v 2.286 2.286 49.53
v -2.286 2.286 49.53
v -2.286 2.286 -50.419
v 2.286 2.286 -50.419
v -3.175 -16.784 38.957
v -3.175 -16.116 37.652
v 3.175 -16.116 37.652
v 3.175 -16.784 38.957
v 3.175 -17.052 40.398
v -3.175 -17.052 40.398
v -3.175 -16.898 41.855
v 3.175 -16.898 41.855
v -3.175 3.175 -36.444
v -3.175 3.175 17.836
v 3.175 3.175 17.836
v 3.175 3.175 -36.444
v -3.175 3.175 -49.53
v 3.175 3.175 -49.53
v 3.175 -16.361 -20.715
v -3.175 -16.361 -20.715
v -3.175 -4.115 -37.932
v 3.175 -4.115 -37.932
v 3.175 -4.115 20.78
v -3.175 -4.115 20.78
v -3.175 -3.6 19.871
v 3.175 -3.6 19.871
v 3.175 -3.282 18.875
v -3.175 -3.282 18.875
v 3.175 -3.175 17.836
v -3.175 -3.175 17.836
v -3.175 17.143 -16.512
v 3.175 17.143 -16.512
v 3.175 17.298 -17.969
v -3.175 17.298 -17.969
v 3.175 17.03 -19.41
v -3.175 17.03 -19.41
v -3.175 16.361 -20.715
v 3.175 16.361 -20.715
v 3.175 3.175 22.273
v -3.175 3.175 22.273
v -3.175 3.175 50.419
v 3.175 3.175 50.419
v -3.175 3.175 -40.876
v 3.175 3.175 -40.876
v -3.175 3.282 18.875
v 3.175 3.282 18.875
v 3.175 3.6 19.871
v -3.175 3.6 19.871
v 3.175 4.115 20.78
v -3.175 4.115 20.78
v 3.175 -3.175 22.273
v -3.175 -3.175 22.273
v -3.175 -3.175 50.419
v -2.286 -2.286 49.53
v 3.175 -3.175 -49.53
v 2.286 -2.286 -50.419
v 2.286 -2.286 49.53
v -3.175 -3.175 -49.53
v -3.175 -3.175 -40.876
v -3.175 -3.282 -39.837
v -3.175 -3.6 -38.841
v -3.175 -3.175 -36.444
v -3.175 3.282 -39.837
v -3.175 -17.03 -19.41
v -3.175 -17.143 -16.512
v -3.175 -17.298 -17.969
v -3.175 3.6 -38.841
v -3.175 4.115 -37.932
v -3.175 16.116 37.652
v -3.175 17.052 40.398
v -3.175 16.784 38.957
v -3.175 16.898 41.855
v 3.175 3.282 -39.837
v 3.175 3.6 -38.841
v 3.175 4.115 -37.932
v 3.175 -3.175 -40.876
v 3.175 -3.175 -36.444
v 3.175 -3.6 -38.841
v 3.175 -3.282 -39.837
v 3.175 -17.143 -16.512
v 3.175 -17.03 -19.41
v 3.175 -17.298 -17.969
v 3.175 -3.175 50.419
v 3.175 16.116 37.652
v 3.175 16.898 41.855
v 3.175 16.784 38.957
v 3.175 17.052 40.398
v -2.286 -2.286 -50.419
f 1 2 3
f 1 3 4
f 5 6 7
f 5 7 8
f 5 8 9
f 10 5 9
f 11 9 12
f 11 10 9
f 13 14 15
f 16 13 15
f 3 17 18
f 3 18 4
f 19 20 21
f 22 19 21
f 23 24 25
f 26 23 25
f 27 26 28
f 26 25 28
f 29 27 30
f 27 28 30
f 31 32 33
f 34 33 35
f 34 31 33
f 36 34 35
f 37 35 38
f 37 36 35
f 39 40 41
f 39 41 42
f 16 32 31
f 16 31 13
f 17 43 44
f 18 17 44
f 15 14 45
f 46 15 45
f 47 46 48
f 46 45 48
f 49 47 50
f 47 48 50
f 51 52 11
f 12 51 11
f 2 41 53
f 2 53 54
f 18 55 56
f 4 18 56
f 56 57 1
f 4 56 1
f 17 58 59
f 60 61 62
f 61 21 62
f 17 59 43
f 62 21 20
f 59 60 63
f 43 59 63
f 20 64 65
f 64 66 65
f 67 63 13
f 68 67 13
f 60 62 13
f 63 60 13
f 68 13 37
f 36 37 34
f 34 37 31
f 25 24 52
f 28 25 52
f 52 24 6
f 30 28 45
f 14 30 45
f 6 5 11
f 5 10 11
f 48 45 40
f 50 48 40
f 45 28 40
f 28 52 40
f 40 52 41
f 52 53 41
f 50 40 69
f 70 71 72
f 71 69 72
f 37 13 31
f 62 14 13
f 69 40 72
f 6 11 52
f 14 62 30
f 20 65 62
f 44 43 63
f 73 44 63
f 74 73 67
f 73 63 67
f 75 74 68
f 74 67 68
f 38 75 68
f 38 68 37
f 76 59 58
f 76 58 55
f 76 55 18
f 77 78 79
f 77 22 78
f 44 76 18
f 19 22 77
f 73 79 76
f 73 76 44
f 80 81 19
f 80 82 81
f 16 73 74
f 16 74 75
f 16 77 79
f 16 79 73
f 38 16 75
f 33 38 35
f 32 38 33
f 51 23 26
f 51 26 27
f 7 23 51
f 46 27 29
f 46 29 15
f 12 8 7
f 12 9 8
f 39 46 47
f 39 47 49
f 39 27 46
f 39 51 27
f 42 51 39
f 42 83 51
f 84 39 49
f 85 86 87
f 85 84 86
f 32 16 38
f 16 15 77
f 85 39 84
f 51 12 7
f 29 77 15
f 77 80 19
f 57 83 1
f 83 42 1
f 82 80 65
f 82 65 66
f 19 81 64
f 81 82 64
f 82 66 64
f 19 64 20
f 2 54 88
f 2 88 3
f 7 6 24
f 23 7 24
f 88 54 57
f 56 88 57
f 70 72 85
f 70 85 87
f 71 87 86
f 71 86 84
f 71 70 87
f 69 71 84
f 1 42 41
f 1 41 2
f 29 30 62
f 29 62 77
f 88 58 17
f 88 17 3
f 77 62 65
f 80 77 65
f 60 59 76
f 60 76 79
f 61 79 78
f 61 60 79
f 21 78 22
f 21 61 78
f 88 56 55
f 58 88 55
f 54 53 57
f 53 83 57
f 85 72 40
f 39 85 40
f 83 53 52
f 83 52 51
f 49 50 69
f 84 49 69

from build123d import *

# Parameters (mm, degrees)
F0_W         = 6.35
F0_H         = 6.35
F0_W_2       = 4.572
F0_H_2       = 4.572
F1_DEPTH     = 50.8
F3_T1_DEPTH  = 4.572
F3_T3_DEPTH  = 4.572
F3_T9_DEPTH  = 7.8380373947
F3_T15_DEPTH = 7.8380373947
F3_T24_DEPTH = 7.8380373947
F3_T30_DEPTH = 7.8380373947
F3_T39_DEPTH = 7.8380373947
F3_T45_DEPTH = 7.8380373947
F3_T54_DEPTH = 7.8380373947
F3_T60_DEPTH = 7.8380373947
F4_T1_DEPTH  = 12.8820747894
F4_T3_DEPTH  = 12.8820747894
F5_DEPTH     = 3.175
F6_T1_DEPTH  = 6.35
F6_T3_DEPTH  = 6.35
F6_T5_DEPTH  = 6.35
F6_T7_DEPTH  = 6.35
F6_T9_DEPTH  = 32.1381754825
F6_T11_DEPTH = 32.1381754825
F6_T13_DEPTH = 32.1381754825
F6_T15_DEPTH = 32.1381754825


# Not quite as in the source:
# - a fillet or chamfer that OpenCascade refuses, or shapes differently, is made with other operations: its cross-section is extruded or revolved along the edge and cut away or added


with BuildPart() as f1:
    # F0 (on Top) → F1 (new body, symmetric)
    with BuildSketch(Plane.XY):
        Rectangle(F0_W, F0_H)
        Rectangle(F0_W_2, F0_H_2, mode=Mode.SUBTRACT)
    extrude(amount=F1_DEPTH, both=True)

    # F3: chamfer of 1.27 on 4 edges, made by hand

    # F3_s2 → F3_t1 (cut)
    with BuildSketch(Plane.YZ.offset(-2.286)):
        Polygon((3.556, 50.8), (2.286, 49.53), (2.286, 50.8), align=None)
        Polygon((-3.556, 50.8), (-2.286, 49.53), (-2.286, 50.8), align=None)
    extrude(amount=F3_T1_DEPTH, mode=Mode.SUBTRACT)

    # F3_s4 → F3_t3 (cut)
    with BuildSketch(Plane.XZ.offset(-2.286)):
        Polygon((-3.556, 50.8), (-2.286, 49.53), (-2.286, 50.8), align=None)
        Polygon((3.556, 50.8), (2.286, 49.53), (2.286, 50.8), align=None)
    extrude(amount=F3_T3_DEPTH, mode=Mode.SUBTRACT)


with BuildPart() as f3_tool7:
    # F3_s8 → F3_t9 (new body)
    with BuildSketch(Plane.YZ.offset(-5.5520373947)):
        Polygon((3.556, 50.8), (2.286, 49.53), (2.286, 50.8), align=None)
    extrude(amount=F3_T9_DEPTH)

    split(bisect_by=Plane.YZ.offset(-3.175), keep=Keep.TOP)

    split(bisect_by=Plane.YZ.offset(-2.286), keep=Keep.BOTTOM)

    split(bisect_by=Plane.XZ.offset(-3.175), keep=Keep.TOP)


with BuildPart() as f3_tool13:
    # F3_s14 → F3_t15 (new body)
    with BuildSketch(Plane.XZ.offset(2.286)):
        Polygon((-3.556, 50.8), (-2.286, 49.53), (-2.286, 50.8), align=None)
    extrude(amount=-F3_T15_DEPTH)

    split(bisect_by=Plane.YZ.offset(-3.175), keep=Keep.TOP)

    split(bisect_by=Plane.XZ.offset(-2.286), keep=Keep.BOTTOM)

    split(bisect_by=Plane.XZ.offset(-3.175), keep=Keep.TOP)


with BuildPart() as f3_tool7_1:
    add(f3_tool7.part)

    # F3_t19: intersect F3_tool13
    add(f3_tool13.part, mode=Mode.INTERSECT)


with BuildPart() as f1_1:
    add(f1.part)

    # F3_t5: cut F3_tool7
    add(f3_tool7_1.part, mode=Mode.SUBTRACT)


with BuildPart() as f3_tool22:
    # F3_s23 → F3_t24 (new body)
    with BuildSketch(Plane.YZ.offset(-2.286)):
        Polygon((3.556, 50.8), (2.286, 49.53), (2.286, 50.8), align=None)
    extrude(amount=F3_T24_DEPTH)

    split(bisect_by=Plane.YZ.offset(3.175), keep=Keep.BOTTOM)

    split(bisect_by=Plane.YZ.offset(2.286), keep=Keep.TOP)

    split(bisect_by=Plane.XZ.offset(-3.175), keep=Keep.TOP)


with BuildPart() as f3_tool28:
    # F3_s29 → F3_t30 (new body)
    with BuildSketch(Plane.XZ.offset(-5.5520373947)):
        Polygon((3.556, 50.8), (2.286, 49.53), (2.286, 50.8), align=None)
    extrude(amount=F3_T30_DEPTH)

    split(bisect_by=Plane.YZ.offset(3.175), keep=Keep.BOTTOM)

    split(bisect_by=Plane.XZ.offset(-2.286), keep=Keep.BOTTOM)

    split(bisect_by=Plane.XZ.offset(-3.175), keep=Keep.TOP)


with BuildPart() as f3_tool22_1:
    add(f3_tool22.part)

    # F3_t34: intersect F3_tool28
    add(f3_tool28.part, mode=Mode.INTERSECT)


with BuildPart() as f1_2:
    add(f1_1.part)

    # F3_t20: cut F3_tool22
    add(f3_tool22_1.part, mode=Mode.SUBTRACT)


with BuildPart() as f3_tool37:
    # F3_s38 → F3_t39 (new body)
    with BuildSketch(Plane.YZ.offset(2.286)):
        Polygon((-3.556, 50.8), (-2.286, 49.53), (-2.286, 50.8), align=None)
    extrude(amount=-F3_T39_DEPTH)

    split(bisect_by=Plane.XZ.offset(3.175), keep=Keep.BOTTOM)

    split(bisect_by=Plane.YZ.offset(-3.175), keep=Keep.TOP)

    split(bisect_by=Plane.YZ.offset(-2.286), keep=Keep.BOTTOM)


with BuildPart() as f3_tool43:
    # F3_s44 → F3_t45 (new body)
    with BuildSketch(Plane.XZ.offset(5.5520373947)):
        Polygon((-3.556, 50.8), (-2.286, 49.53), (-2.286, 50.8), align=None)
    extrude(amount=-F3_T45_DEPTH)

    split(bisect_by=Plane.XZ.offset(3.175), keep=Keep.BOTTOM)

    split(bisect_by=Plane.YZ.offset(-3.175), keep=Keep.TOP)

    split(bisect_by=Plane.XZ.offset(2.286), keep=Keep.TOP)


with BuildPart() as f3_tool37_1:
    add(f3_tool37.part)

    # F3_t49: intersect F3_tool43
    add(f3_tool43.part, mode=Mode.INTERSECT)


with BuildPart() as f1_3:
    add(f1_2.part)

    # F3_t35: cut F3_tool37
    add(f3_tool37_1.part, mode=Mode.SUBTRACT)


with BuildPart() as f3_tool52:
    # F3_s53 → F3_t54 (new body)
    with BuildSketch(Plane.XZ.offset(-2.286)):
        Polygon((3.556, 50.8), (2.286, 49.53), (2.286, 50.8), align=None)
    extrude(amount=F3_T54_DEPTH)

    split(bisect_by=Plane.YZ.offset(3.175), keep=Keep.BOTTOM)

    split(bisect_by=Plane.XZ.offset(3.175), keep=Keep.BOTTOM)

    split(bisect_by=Plane.XZ.offset(2.286), keep=Keep.TOP)


with BuildPart() as f3_tool58:
    # F3_s59 → F3_t60 (new body)
    with BuildSketch(Plane.YZ.offset(5.5520373947)):
        Polygon((-3.556, 50.8), (-2.286, 49.53), (-2.286, 50.8), align=None)
    extrude(amount=-F3_T60_DEPTH)

    split(bisect_by=Plane.YZ.offset(3.175), keep=Keep.BOTTOM)

    split(bisect_by=Plane.XZ.offset(3.175), keep=Keep.BOTTOM)

    split(bisect_by=Plane.YZ.offset(2.286), keep=Keep.TOP)


with BuildPart() as f3_tool52_1:
    add(f3_tool52.part)

    # F3_t64: intersect F3_tool58
    add(f3_tool58.part, mode=Mode.INTERSECT)


with BuildPart() as f1_4:
    add(f1_3.part)

    # F3_t50: cut F3_tool52
    add(f3_tool52_1.part, mode=Mode.SUBTRACT)

    # F4: chamfer of 1.27 on 4 edges, made by hand

    # F4_s2 → F4_t1 (cut)
    with BuildSketch(Plane.XZ.offset(-6.4410373947)):
        Polygon((3.175, -49.53), (1.905, -50.8), (3.175, -50.8), align=None)
        Polygon((-3.175, -49.53), (-1.905, -50.8), (-3.175, -50.8), align=None)
    extrude(amount=F4_T1_DEPTH, mode=Mode.SUBTRACT)

    # F4_s4 → F4_t3 (cut)
    with BuildSketch(Plane.YZ.offset(-6.4410373947)):
        Polygon((-1.905, -50.8), (-3.175, -49.53), (-3.175, -50.8), align=None)
        Polygon((3.175, -49.53), (1.905, -50.8), (3.175, -50.8), align=None)
    extrude(amount=F4_T3_DEPTH, mode=Mode.SUBTRACT)

    # F2 (on Right) → F5 (join, symmetric)
    with BuildSketch(Plane.YZ):
        Polygon((-19.1053829622, 41.8550837785), (-2.5904842187, 18.636116758), (-2.3452136666, 21.0888255388), (-16.897945432, 41.8550837785), align=None)
        Polygon((-19.3506535143, -16.5116898715), (-2.8357547708, -39.7306568921), (-2.5904842187, -37.2779481113), (-17.1432159841, -16.5116898715), align=None)
        Polygon((2.5904842187, 18.636116758), (19.1053829622, 41.8550837785), (16.897945432, 41.8550837785), (2.3452136666, 21.0888255388), align=None)
        Polygon((17.1432159841, -16.5116898715), (2.5904842187, -37.2779481113), (2.8357547708, -39.7306568921), (19.3506535143, -16.5116898715), align=None)
    extrude(amount=F5_DEPTH, both=True)

    # F6: fillet of radius 5.08 on 8 edges, made by hand

    # F6_s2 → F6_t1 (join)
    with BuildSketch(Plane.YZ.offset(-3.175)):
        with BuildLine():
            ThreePointArc((-3.175, -40.8760570484), (-3.415789898, -39.3305973794), (-4.1153329089, -37.931646008))
            Line((-4.1153329089, -37.931646008), (-3.175, -39.2536982433))
            Line((-3.175, -39.2536982433), (-3.175, -40.8760570484))
        make_face()
    extrude(amount=F6_T1_DEPTH)

    # F6_s4 → F6_t3 (join)
    with BuildSketch(Plane.YZ.offset(-3.175)):
        with BuildLine():
            ThreePointArc((-4.1153329089, 20.7799634748), (-3.415789898, 19.3810121034), (-3.175, 17.8355524344))
            Line((-3.175, 17.8355524344), (-3.175, 19.4579112395))
            Line((-3.175, 19.4579112395), (-4.1153329089, 20.7799634748))
        make_face()
    extrude(amount=F6_T3_DEPTH)

    # F6_s6 → F6_t5 (join)
    with BuildSketch(Plane.YZ.offset(-3.175)):
        with BuildLine():
            ThreePointArc((3.175, 17.8355524344), (3.415789898, 19.3810121034), (4.1153329089, 20.7799634748))
            Line((4.1153329089, 20.7799634748), (3.175, 19.4579112395))
            Line((3.175, 19.4579112395), (3.175, 17.8355524344))
        make_face()
    extrude(amount=F6_T5_DEPTH)

    # F6_s8 → F6_t7 (join)
    with BuildSketch(Plane.YZ.offset(-3.175)):
        with BuildLine():
            ThreePointArc((3.175, -40.8760570484), (3.415789898, -39.3305973794), (4.1153329089, -37.931646008))
            Line((4.1153329089, -37.931646008), (3.175, -39.2536982433))
            Line((3.175, -39.2536982433), (3.175, -40.8760570484))
        make_face()
    extrude(amount=F6_T7_DEPTH)

    # F6_s10 → F6_t9 (cut)
    with BuildSketch(Plane.YZ.offset(-16.0690877412)):
        with BuildLine():
            ThreePointArc((-17.1432159841, -16.5116898715), (-17.2158715108, -18.6994178747), (-16.3612445142, -20.7146214221))
            Line((-16.3612445142, -20.7146214221), (-19.3506535143, -16.5116898715))
            Line((-19.3506535143, -16.5116898715), (-17.1432159841, -16.5116898715))
        make_face()
    extrude(amount=F6_T9_DEPTH, mode=Mode.SUBTRACT)

    # F6_s12 → F6_t11 (cut)
    with BuildSketch(Plane.YZ.offset(-16.0690877412)):
        with BuildLine():
            ThreePointArc((-16.1159739621, 37.6521522279), (-16.9706009587, 39.6673557754), (-16.897945432, 41.8550837785))
            Line((-16.897945432, 41.8550837785), (-19.1053829622, 41.8550837785))
            Line((-19.1053829622, 41.8550837785), (-16.1159739621, 37.6521522279))
        make_face()
    extrude(amount=F6_T11_DEPTH, mode=Mode.SUBTRACT)

    # F6_s14 → F6_t13 (cut)
    with BuildSketch(Plane.YZ.offset(-16.0690877412)):
        with BuildLine():
            ThreePointArc((16.897945432, 41.8550837785), (16.9706009587, 39.6673557754), (16.1159739621, 37.6521522279))
            Line((16.1159739621, 37.6521522279), (19.1053829622, 41.8550837785))
            Line((19.1053829622, 41.8550837785), (16.897945432, 41.8550837785))
        make_face()
    extrude(amount=F6_T13_DEPTH, mode=Mode.SUBTRACT)

    # F6_s16 → F6_t15 (cut)
    with BuildSketch(Plane.YZ.offset(-16.0690877412)):
        with BuildLine():
            ThreePointArc((17.1432159841, -16.5116898715), (17.2158715108, -18.6994178747), (16.3612445142, -20.7146214221))
            Line((16.3612445142, -20.7146214221), (19.3506535143, -16.5116898715))
            Line((19.3506535143, -16.5116898715), (17.1432159841, -16.5116898715))
        make_face()
    extrude(amount=F6_T15_DEPTH, mode=Mode.SUBTRACT)


solid = f1_4.part
